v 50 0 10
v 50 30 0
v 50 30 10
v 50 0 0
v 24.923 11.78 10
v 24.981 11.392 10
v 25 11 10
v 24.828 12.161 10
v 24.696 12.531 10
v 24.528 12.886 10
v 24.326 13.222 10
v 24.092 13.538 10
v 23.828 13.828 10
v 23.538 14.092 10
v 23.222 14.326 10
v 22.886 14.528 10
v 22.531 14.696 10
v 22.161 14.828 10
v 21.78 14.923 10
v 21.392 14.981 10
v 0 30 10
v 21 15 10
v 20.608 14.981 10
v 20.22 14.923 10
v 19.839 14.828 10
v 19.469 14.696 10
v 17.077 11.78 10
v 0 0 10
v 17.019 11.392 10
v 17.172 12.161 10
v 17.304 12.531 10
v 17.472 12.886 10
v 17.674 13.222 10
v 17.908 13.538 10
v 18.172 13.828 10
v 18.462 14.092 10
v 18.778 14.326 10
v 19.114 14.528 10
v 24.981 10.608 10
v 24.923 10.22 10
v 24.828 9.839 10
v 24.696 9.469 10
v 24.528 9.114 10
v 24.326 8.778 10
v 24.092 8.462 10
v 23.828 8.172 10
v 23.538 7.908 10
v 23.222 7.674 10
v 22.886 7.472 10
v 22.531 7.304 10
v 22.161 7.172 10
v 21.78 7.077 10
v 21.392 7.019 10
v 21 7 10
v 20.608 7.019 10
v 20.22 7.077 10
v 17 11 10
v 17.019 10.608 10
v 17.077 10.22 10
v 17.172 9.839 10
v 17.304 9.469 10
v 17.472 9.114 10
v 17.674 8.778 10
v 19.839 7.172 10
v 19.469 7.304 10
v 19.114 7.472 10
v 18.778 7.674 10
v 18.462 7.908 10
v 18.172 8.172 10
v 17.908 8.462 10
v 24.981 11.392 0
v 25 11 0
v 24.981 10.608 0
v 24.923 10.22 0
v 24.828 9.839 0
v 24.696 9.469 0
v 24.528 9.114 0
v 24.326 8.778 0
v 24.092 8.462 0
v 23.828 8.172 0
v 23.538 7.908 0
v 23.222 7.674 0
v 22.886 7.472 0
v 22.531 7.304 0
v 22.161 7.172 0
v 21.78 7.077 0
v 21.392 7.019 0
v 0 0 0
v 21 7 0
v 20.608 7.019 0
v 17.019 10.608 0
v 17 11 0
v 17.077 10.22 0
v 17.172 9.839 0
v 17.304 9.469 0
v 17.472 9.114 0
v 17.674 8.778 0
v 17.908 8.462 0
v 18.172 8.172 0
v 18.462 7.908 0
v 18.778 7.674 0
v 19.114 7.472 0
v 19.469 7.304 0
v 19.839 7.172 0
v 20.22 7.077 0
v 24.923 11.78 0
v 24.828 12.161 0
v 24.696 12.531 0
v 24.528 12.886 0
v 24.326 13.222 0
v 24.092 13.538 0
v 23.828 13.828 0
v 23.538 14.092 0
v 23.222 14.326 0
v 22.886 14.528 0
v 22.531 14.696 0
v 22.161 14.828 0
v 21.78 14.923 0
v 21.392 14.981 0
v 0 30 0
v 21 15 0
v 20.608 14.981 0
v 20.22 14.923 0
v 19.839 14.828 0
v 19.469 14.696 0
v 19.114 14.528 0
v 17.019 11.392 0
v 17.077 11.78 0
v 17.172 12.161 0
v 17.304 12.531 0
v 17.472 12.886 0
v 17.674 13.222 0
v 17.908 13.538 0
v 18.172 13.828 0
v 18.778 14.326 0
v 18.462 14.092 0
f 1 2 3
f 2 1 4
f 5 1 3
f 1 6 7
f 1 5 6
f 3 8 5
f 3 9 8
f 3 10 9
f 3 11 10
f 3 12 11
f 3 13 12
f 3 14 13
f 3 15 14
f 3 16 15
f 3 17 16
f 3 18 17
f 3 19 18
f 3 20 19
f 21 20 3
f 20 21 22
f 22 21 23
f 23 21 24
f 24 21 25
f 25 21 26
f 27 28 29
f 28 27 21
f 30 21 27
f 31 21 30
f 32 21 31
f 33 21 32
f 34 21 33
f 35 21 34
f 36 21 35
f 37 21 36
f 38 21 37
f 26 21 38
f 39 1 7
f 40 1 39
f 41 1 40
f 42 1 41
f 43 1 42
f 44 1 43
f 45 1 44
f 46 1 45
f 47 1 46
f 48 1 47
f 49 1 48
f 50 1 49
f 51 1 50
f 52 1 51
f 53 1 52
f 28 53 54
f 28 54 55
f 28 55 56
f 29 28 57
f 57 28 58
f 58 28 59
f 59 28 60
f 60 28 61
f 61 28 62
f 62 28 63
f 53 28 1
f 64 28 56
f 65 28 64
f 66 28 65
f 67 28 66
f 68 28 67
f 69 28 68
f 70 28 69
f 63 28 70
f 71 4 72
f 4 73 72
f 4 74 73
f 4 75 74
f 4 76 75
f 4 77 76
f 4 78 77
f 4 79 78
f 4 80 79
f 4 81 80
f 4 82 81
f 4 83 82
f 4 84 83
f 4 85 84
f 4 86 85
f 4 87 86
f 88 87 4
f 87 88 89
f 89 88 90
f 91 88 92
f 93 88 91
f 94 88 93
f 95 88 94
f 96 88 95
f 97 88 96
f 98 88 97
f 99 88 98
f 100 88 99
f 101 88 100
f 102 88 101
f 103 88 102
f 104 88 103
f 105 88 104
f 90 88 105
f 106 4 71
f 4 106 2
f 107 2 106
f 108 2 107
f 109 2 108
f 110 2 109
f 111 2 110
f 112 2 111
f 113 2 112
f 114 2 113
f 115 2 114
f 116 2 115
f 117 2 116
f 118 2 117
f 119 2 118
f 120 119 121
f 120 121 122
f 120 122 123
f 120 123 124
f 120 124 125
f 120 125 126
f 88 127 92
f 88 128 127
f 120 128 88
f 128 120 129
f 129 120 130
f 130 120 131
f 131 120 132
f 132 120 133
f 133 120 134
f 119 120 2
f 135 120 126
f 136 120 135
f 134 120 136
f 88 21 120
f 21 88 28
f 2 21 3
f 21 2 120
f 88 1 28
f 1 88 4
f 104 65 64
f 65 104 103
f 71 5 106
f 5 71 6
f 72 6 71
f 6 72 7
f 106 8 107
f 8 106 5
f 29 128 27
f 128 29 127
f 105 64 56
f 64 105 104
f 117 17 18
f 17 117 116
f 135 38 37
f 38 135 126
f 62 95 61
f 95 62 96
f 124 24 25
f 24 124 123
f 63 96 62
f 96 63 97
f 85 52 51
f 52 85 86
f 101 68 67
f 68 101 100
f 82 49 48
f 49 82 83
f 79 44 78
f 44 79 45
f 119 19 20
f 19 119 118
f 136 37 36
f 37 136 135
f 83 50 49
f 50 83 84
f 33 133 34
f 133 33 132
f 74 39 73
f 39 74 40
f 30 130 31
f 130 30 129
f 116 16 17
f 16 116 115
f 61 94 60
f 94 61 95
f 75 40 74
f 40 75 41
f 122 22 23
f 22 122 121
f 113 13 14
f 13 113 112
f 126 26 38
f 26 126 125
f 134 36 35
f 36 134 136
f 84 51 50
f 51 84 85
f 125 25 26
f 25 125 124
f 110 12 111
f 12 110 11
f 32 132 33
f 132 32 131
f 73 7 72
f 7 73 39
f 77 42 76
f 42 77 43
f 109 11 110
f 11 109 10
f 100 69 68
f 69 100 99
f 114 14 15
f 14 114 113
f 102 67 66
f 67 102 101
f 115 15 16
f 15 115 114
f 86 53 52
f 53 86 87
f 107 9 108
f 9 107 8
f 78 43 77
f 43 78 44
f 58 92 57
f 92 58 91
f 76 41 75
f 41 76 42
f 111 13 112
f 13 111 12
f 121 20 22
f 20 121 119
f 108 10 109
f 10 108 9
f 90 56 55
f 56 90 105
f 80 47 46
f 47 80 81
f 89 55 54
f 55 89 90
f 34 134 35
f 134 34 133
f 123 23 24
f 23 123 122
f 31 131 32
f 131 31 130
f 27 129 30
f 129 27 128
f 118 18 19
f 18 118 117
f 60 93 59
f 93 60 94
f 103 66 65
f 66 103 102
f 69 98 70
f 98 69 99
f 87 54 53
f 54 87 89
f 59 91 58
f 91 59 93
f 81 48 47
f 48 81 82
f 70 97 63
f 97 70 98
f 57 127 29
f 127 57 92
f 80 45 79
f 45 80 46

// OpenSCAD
$fn = 64;

module box_with_hole(width, depth, height, hole_diameter) {
    difference() {
        cube([width, depth, height], center=false);
        
        translate([(width/2)-hole_diameter/2, (depth/2)-hole_diameter/2, -1])
            cylinder(h=height+2, d=hole_diameter);
    }
}

box_with_hole(50, 30, 10, 8);
